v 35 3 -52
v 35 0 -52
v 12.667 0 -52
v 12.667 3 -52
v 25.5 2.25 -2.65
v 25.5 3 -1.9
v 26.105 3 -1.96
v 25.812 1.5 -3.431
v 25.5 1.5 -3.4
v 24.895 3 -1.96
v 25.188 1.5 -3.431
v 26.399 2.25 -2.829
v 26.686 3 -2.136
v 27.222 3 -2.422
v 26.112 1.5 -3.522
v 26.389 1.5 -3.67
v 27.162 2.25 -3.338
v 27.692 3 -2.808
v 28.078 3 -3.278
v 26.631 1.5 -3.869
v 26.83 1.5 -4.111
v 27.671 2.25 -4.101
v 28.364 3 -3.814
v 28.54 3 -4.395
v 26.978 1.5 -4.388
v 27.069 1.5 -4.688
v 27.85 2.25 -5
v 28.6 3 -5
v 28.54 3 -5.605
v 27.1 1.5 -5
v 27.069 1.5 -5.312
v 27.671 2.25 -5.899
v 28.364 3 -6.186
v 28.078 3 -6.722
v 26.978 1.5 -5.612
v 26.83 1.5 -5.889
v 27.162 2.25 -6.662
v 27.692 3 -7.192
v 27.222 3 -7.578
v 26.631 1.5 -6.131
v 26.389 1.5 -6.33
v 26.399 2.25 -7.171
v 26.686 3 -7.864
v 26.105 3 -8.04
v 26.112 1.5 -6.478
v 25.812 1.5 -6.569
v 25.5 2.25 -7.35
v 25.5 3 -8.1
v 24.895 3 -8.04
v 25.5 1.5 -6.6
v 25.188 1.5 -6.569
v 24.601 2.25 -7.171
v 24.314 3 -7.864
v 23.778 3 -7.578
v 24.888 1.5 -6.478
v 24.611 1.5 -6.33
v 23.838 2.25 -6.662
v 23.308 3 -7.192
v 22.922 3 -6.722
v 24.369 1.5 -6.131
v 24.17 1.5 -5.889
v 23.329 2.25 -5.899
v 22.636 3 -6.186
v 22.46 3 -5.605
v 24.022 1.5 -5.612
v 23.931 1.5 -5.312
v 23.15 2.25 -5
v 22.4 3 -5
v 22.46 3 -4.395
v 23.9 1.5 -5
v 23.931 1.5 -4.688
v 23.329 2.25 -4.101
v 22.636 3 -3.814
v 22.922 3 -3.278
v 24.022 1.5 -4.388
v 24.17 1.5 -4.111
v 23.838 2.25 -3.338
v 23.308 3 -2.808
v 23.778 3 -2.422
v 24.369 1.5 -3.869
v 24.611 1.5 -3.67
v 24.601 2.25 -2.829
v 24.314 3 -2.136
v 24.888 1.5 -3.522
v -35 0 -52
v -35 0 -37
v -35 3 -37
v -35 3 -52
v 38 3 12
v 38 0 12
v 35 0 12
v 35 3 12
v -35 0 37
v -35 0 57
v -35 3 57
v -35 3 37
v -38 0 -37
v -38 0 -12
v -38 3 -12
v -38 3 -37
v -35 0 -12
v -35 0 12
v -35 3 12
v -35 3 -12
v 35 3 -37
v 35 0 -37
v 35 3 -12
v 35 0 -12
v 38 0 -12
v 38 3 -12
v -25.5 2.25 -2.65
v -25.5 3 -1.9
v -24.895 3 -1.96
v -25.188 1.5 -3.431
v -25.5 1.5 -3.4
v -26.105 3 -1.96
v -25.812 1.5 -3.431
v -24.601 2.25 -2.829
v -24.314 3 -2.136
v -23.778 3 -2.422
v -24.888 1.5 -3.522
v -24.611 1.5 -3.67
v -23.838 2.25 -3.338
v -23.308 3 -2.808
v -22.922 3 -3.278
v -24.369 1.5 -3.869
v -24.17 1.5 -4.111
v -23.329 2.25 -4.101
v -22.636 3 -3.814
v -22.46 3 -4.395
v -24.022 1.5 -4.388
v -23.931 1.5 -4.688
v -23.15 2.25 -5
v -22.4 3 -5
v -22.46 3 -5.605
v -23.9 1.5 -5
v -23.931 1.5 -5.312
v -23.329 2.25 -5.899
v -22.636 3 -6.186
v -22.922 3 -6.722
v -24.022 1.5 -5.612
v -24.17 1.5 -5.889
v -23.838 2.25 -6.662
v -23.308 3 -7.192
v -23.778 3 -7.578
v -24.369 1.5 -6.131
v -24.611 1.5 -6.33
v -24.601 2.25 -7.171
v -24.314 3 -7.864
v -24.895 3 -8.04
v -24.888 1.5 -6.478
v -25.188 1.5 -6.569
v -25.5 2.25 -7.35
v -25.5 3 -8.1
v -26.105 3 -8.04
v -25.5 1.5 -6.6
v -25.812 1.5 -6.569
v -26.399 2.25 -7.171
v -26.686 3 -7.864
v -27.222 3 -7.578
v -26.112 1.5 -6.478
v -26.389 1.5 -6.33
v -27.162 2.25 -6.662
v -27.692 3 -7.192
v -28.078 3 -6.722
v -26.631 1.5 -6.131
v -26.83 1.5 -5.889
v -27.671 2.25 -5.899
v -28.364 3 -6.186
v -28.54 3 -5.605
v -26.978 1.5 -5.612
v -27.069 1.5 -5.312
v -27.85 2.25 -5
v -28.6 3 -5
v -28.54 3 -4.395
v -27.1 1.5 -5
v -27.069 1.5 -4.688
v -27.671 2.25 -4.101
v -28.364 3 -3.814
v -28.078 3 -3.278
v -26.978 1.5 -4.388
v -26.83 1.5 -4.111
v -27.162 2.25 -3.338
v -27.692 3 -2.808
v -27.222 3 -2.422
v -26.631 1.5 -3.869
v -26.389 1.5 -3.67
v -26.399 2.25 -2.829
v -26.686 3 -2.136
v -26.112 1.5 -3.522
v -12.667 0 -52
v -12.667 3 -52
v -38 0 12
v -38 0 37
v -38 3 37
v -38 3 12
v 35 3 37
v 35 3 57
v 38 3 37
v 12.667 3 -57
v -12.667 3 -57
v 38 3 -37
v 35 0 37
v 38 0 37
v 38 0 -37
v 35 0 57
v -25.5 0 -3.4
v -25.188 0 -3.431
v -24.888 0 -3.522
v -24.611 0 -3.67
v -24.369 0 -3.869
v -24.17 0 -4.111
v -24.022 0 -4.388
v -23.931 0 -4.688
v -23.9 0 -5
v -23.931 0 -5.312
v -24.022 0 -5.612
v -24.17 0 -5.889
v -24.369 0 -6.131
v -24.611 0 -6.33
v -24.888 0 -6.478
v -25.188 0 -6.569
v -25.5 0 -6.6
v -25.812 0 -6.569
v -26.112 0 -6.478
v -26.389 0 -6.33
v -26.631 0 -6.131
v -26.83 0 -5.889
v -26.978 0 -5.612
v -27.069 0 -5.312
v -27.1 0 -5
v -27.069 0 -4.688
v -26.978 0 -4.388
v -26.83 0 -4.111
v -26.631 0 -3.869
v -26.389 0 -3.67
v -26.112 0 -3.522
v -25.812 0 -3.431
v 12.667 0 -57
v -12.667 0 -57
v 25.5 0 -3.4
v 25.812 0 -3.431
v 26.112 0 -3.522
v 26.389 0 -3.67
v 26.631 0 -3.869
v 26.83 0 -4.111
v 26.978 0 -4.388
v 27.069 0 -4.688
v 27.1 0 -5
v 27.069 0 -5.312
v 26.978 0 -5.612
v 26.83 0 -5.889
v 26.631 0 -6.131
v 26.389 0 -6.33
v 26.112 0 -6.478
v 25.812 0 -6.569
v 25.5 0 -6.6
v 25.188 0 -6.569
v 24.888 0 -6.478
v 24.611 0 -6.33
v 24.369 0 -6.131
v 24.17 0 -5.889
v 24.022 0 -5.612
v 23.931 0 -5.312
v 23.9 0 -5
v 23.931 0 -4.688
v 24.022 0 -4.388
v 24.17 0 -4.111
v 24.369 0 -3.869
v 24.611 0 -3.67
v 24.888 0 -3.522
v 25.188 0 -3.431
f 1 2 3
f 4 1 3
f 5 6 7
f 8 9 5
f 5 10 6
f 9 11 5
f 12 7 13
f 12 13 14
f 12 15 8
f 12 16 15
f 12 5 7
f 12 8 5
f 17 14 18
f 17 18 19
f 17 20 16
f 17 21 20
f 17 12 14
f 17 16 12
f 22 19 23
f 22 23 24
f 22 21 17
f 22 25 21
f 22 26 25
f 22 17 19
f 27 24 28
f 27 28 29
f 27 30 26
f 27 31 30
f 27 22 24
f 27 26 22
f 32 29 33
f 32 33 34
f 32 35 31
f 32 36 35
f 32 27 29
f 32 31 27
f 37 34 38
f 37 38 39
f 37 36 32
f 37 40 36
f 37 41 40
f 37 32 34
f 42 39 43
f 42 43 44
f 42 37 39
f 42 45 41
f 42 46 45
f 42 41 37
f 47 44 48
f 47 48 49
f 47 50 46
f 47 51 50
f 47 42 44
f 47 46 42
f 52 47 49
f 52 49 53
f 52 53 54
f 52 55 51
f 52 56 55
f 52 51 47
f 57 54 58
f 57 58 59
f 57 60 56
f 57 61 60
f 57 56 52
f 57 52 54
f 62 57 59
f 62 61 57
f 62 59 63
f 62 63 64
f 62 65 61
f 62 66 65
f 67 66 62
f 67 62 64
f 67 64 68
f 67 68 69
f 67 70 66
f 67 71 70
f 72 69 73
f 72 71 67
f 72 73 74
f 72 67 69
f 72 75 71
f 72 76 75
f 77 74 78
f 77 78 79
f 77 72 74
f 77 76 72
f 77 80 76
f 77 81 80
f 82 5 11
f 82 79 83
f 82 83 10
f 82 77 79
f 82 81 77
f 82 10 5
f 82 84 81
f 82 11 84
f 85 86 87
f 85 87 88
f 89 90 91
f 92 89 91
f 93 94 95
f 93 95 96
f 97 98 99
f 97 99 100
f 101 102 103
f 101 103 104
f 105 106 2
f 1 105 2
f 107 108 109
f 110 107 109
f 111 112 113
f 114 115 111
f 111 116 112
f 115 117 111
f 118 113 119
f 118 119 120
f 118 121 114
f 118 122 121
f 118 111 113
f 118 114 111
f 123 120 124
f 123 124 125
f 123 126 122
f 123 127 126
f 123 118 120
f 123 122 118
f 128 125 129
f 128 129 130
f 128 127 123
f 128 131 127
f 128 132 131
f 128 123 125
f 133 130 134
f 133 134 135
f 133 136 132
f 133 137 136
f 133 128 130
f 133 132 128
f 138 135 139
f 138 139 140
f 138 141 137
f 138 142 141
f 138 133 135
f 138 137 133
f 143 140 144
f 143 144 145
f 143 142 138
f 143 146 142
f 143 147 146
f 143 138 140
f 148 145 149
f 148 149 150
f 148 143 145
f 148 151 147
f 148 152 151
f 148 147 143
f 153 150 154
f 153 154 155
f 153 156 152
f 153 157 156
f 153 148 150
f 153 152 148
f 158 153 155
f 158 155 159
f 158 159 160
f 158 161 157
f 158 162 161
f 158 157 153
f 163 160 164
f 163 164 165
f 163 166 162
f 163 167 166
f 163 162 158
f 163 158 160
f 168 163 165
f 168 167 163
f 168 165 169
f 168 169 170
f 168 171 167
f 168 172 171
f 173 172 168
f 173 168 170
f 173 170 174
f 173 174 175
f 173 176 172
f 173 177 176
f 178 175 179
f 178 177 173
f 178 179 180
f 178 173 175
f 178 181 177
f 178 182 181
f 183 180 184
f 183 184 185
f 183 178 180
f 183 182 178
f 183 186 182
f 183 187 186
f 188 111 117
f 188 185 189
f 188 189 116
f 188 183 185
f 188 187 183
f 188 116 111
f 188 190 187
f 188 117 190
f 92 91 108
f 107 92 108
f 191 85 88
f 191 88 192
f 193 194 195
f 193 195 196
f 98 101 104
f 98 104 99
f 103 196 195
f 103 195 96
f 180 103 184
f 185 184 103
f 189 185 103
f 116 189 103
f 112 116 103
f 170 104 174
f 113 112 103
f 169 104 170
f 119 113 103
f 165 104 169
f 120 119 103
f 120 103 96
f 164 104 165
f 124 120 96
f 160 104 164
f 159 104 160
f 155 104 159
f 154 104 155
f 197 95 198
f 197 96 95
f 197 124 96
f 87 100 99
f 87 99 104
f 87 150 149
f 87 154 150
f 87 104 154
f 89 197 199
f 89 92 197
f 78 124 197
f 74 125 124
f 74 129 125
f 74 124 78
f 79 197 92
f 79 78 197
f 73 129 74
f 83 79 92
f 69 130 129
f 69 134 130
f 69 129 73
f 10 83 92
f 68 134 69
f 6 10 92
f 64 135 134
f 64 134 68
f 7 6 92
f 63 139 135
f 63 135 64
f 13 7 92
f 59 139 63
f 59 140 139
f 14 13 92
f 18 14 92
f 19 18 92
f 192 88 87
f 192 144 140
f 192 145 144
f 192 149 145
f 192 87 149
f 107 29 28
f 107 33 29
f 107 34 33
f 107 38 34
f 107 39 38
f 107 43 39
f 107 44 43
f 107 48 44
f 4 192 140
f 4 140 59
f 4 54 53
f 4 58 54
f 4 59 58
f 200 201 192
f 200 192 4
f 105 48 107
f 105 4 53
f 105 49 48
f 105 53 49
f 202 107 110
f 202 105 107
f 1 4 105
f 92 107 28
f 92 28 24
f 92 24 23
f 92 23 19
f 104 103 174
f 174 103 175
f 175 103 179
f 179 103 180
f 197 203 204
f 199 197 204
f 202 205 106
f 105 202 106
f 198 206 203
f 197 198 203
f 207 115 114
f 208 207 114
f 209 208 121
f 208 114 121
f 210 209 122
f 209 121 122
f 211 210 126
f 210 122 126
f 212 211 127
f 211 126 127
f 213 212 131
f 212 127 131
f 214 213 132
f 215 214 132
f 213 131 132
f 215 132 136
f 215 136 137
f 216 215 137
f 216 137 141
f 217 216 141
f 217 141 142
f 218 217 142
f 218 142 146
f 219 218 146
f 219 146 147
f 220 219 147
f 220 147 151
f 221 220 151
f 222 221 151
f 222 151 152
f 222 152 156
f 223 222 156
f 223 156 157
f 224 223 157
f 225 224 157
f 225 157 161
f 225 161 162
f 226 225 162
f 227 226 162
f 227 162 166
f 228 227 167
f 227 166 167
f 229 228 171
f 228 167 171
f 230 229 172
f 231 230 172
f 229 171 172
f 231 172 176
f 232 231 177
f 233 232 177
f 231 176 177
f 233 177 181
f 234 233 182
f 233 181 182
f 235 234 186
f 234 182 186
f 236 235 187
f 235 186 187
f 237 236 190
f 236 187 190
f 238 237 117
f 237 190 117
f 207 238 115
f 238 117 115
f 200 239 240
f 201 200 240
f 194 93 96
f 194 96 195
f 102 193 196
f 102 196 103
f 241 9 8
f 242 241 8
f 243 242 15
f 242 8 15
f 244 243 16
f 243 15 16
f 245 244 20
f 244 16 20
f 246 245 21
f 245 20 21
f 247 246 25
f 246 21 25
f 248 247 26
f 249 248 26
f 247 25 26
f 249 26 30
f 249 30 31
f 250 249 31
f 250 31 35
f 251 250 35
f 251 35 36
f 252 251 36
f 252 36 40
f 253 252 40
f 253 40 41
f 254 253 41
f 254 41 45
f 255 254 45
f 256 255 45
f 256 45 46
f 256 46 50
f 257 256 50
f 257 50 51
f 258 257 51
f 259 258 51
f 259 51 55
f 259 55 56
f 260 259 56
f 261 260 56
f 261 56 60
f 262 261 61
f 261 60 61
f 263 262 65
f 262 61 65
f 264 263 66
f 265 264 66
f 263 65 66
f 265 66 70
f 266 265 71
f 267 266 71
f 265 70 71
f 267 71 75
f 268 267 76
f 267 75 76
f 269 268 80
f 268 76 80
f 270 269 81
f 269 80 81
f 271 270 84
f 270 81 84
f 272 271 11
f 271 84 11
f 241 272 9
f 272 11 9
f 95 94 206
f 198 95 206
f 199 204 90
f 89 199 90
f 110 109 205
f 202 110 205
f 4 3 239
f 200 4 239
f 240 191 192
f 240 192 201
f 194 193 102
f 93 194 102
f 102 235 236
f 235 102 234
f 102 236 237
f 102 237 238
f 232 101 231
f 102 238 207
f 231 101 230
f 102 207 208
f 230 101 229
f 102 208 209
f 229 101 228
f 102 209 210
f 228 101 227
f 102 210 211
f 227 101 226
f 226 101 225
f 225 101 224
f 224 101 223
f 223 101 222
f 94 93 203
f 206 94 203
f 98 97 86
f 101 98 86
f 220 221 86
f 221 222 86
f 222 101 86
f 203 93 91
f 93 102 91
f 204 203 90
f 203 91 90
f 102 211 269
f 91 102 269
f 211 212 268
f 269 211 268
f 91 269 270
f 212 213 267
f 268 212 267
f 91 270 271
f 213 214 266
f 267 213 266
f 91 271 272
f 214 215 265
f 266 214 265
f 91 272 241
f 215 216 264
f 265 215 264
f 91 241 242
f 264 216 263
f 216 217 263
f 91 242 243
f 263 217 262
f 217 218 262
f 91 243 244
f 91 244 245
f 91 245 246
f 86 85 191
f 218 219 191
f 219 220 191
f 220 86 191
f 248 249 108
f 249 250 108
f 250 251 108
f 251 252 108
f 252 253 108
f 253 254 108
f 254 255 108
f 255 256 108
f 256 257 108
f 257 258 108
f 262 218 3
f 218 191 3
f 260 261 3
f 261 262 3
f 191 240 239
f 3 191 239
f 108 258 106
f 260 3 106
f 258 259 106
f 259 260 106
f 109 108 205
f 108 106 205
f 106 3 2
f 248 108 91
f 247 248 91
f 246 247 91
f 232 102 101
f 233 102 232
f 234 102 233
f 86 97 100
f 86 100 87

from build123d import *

# Parameters (mm, degrees)
BOSS_EXTRUDE1_DEPTH = 3
SKETCH2_R           = 1.6
CUT_EXTRUDE1_DEPTH  = 69.571130952
CHAMFER1_SIZE       = 1.5


with BuildPart() as part:
    # Sketch1 → Boss-Extrude1 (new body)
    with BuildSketch(Plane(origin=(0, 0, 0), x_dir=(1, 0, 0), z_dir=(0, 1, 0))):
        Polygon((0, -57), (-35, -57), (-35, -37), (-38, -37), (-38, -12), (-35, -12), (-35, 12), (-38, 12), (-38, 37), (-35, 37), (-35, 52), (-12.666666667, 52), (-12.666666667, 57), (0, 57), align=None)
    boss_extrude1 = extrude(amount=BOSS_EXTRUDE1_DEPTH)

    # Mirror1: Boss-Extrude1 across plane
    add(boss_extrude1.mirror(Plane(origin=(0, 3, -57), x_dir=(0, 0, 1), z_dir=(-1, 0, 0))))

    # Sketch2 → Cut-Extrude1 (cut, through all)
    with BuildSketch(Plane(origin=(0, 3, 0), x_dir=(1, 0, 0), z_dir=(0, 1, 0))):
        with Locations(Location((-25.5, 5, 0), (0, 0, 270))):
            Circle(SKETCH2_R)
        with Locations(Location((25.5, 5, 0), (0, 0, 270))):
            Circle(SKETCH2_R)
    extrude(amount=-CUT_EXTRUDE1_DEPTH, mode=Mode.SUBTRACT)

    # Chamfer1
    chamfer1_edges = [part.edges().sort_by_distance(p)[0] for p in [
        (-25.5, 3, -6.6),
        (25.5, 3, -6.6),
    ]]
    chamfer(chamfer1_edges, length=CHAMFER1_SIZE)


solid = part.part
